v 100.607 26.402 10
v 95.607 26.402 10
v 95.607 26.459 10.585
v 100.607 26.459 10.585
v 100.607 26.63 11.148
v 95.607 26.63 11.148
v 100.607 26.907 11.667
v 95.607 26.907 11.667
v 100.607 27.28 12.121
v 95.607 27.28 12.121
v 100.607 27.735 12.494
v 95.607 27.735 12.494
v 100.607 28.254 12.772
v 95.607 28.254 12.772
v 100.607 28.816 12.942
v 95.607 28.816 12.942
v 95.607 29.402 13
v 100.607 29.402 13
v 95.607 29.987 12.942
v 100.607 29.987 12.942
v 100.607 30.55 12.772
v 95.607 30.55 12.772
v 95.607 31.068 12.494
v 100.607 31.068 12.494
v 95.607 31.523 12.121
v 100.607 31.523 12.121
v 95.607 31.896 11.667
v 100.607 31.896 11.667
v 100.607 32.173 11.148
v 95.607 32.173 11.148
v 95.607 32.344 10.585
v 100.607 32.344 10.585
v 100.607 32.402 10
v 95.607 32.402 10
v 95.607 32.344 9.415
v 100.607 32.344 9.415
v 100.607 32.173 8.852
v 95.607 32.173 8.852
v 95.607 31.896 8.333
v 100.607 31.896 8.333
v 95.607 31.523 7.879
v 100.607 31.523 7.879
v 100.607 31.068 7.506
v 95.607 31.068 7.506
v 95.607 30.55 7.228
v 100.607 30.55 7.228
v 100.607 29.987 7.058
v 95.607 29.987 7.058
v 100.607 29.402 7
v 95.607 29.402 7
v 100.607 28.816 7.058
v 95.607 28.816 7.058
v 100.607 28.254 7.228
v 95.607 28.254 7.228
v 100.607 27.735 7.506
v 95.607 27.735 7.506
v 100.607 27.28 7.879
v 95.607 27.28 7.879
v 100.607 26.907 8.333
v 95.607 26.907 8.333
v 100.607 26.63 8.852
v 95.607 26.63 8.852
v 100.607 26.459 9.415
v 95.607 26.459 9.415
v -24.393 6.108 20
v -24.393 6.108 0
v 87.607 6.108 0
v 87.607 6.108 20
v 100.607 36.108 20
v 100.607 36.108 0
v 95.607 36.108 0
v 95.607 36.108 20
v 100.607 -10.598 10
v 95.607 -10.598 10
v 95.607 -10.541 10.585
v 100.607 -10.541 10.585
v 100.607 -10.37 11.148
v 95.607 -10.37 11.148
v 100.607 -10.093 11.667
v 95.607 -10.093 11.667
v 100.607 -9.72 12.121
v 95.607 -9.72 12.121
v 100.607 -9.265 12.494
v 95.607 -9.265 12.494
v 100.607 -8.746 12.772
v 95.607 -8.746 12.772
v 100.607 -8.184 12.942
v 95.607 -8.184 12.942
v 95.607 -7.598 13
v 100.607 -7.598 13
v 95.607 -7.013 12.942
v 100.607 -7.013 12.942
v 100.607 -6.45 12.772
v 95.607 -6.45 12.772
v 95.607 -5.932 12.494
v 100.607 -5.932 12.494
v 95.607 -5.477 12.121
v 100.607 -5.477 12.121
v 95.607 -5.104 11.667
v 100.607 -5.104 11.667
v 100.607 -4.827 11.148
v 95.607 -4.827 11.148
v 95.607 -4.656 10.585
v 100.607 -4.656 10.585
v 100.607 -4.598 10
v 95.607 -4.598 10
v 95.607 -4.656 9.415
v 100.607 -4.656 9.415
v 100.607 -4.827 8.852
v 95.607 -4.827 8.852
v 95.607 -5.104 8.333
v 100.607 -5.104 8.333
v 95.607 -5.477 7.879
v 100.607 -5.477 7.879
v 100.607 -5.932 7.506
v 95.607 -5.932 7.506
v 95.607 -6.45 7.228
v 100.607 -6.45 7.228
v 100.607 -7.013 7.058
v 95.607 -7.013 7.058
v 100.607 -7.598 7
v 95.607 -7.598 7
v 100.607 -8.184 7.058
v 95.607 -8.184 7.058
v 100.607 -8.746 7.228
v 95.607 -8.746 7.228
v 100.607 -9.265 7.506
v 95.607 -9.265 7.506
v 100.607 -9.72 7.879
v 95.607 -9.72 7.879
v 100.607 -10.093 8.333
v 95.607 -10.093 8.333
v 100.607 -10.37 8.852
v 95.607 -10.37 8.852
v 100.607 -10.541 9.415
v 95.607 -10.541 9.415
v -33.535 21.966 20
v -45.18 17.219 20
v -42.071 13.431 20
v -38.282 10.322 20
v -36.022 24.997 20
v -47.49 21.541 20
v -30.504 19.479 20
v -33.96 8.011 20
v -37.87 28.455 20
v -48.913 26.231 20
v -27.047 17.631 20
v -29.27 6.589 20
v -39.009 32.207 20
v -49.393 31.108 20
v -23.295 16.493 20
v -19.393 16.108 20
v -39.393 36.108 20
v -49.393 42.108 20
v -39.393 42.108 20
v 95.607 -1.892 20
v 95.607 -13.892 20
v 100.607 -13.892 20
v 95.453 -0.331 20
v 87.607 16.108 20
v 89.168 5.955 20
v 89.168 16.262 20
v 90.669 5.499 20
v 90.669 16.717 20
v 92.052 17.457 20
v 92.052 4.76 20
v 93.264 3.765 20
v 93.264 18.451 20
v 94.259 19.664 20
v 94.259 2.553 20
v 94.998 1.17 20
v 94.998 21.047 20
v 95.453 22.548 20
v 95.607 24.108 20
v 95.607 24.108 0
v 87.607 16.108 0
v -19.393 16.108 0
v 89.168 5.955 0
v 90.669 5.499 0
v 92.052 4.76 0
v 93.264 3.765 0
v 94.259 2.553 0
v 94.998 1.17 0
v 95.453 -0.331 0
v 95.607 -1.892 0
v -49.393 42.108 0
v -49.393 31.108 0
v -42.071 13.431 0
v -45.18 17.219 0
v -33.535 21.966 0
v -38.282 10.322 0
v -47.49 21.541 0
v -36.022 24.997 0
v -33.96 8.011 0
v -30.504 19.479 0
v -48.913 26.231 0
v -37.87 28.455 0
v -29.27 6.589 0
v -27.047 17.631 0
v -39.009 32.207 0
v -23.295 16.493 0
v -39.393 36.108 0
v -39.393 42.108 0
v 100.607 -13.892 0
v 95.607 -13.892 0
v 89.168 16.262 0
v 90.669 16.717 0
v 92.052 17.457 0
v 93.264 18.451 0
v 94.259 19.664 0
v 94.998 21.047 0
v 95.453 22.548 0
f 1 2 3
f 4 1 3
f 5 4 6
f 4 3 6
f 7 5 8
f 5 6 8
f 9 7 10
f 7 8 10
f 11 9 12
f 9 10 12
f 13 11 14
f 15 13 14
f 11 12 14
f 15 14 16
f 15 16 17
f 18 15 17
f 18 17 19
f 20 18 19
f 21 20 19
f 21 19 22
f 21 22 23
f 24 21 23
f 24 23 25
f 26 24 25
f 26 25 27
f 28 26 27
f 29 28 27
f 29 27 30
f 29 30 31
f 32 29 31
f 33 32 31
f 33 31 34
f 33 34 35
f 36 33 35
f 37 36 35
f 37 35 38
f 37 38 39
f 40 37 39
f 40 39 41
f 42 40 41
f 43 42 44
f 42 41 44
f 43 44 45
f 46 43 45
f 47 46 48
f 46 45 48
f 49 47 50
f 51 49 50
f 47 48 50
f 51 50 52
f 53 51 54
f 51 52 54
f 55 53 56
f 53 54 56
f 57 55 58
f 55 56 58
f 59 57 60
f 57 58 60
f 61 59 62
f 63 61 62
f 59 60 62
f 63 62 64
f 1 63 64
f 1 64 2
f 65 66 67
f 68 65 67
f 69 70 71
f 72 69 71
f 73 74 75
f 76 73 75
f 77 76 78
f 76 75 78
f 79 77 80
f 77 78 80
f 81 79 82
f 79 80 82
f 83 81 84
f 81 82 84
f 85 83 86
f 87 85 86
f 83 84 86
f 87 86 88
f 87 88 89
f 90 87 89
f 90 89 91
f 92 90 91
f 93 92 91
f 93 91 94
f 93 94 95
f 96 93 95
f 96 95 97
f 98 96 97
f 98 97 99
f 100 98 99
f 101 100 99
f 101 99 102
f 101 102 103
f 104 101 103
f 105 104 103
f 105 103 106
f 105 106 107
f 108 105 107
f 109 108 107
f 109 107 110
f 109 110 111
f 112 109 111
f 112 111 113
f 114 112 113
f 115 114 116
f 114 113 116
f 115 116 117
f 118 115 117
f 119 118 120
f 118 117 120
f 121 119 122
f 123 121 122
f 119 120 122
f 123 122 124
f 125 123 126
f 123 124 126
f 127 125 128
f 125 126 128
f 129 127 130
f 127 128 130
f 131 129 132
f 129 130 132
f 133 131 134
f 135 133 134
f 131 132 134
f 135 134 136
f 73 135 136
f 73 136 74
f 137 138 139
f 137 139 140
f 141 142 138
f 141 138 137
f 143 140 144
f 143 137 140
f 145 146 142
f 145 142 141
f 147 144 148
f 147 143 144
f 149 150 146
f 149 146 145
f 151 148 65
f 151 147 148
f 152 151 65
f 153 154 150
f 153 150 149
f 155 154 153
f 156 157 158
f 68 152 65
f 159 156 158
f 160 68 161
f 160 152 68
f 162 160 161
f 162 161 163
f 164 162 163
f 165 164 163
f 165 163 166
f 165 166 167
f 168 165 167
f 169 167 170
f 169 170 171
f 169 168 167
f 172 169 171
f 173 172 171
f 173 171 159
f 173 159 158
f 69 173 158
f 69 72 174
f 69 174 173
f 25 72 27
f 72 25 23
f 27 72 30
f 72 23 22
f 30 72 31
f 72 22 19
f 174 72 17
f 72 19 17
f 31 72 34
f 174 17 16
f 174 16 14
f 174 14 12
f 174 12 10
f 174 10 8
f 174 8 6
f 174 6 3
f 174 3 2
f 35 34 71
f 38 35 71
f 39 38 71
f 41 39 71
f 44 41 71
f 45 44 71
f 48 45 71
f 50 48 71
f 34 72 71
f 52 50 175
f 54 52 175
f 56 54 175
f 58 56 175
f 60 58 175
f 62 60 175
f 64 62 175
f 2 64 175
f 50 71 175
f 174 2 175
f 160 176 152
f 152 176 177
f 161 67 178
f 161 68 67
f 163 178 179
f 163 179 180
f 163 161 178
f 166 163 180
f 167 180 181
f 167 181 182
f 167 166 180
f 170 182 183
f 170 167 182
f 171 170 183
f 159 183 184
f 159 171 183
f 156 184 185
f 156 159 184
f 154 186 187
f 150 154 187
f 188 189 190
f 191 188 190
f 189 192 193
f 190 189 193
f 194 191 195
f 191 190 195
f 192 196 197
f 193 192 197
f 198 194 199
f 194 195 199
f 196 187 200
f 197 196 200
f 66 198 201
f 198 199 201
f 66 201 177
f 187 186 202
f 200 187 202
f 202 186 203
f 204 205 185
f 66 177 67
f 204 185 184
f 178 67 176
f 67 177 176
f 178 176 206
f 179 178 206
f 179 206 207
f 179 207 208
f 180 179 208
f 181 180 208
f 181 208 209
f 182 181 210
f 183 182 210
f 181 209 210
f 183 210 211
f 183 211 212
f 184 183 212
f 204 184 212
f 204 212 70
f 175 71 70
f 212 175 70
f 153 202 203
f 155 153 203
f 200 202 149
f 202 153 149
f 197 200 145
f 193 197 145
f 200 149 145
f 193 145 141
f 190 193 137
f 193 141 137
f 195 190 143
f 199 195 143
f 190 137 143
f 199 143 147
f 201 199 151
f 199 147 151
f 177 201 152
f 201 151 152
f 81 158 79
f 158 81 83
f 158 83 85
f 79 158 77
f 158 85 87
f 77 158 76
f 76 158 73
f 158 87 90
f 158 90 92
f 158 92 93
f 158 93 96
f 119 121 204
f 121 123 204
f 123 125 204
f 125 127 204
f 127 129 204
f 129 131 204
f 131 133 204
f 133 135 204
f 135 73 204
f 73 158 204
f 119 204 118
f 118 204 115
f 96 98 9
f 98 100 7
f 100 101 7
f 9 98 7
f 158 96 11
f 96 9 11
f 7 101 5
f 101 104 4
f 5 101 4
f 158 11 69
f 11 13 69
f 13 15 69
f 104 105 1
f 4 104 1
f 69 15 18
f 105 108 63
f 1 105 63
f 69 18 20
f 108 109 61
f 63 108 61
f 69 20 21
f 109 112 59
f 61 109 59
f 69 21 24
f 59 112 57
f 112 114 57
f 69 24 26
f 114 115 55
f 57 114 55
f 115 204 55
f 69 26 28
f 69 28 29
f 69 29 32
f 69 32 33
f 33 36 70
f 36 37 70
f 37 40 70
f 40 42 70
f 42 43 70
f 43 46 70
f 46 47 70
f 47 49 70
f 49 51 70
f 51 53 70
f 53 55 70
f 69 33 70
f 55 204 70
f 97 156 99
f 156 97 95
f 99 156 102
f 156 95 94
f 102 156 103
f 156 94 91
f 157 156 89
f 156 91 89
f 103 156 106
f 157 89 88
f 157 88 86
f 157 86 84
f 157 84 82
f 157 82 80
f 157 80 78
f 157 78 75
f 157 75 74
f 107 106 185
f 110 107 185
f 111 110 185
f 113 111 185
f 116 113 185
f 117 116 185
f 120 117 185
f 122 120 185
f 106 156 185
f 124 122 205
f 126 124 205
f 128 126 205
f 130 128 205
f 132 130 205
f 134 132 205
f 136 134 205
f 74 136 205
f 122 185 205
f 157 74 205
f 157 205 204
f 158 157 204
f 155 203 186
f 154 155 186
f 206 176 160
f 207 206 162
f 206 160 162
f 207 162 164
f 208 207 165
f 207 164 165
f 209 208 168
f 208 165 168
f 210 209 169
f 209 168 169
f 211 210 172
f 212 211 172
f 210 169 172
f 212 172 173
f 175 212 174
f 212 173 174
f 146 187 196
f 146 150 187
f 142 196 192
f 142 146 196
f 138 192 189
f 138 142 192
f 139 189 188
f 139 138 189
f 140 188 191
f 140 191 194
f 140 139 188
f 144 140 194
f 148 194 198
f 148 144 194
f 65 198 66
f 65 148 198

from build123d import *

# Parameters (mm, degrees)
F1_DEPTH = 20
F2_R     = 25
F3_R     = 8
F4_R     = 3
F5_DEPTH = 25
F6_R     = 20


with BuildPart() as f1:
    # F0 (on Top) → F1 (new body)
    with BuildSketch(Plane.XY):
        Polygon((95.607106, 36.108327), (95.607106, 16.108327), (-39.392894, 16.108327), (-39.392894, 42.108327), (-49.392894, 42.108327), (-49.392894, 6.108327), (95.607106, 6.108327), (95.607106, -13.891673), (100.607106, -13.891673), (100.607106, 16.108327), (100.607106, 36.108327), align=None)
    extrude(amount=F1_DEPTH)

    # F2
    f2_edges = [f1.edges().sort_by_distance(p)[0] for p in [
        (-49.392894, 6.108327, 10),
    ]]
    fillet(f2_edges, radius=F2_R)

    # F3
    f3_edges = [f1.edges().sort_by_distance(p)[0] for p in [
        (95.607106, 6.108327, 10),
        (95.607106, 16.108327, 10),
    ]]
    fillet(f3_edges, radius=F3_R)

    # F4 (on face) → F5 (cut)
    with BuildSketch(Plane(origin=(95.607106, 0, 0), x_dir=(0, -1, 0), z_dir=(-1, 0, 0))):
        with Locations((7.59841, 10)):
            Circle(F4_R)
        with Locations((-29.40159, 10)):
            Circle(F4_R)
    extrude(amount=-F5_DEPTH, mode=Mode.SUBTRACT)

    # F6
    f6_edges = [f1.edges().sort_by_distance(p)[0] for p in [
        (-39.392894, 16.108327, 10),
    ]]
    fillet(f6_edges, radius=F6_R)


solid = f1.part
